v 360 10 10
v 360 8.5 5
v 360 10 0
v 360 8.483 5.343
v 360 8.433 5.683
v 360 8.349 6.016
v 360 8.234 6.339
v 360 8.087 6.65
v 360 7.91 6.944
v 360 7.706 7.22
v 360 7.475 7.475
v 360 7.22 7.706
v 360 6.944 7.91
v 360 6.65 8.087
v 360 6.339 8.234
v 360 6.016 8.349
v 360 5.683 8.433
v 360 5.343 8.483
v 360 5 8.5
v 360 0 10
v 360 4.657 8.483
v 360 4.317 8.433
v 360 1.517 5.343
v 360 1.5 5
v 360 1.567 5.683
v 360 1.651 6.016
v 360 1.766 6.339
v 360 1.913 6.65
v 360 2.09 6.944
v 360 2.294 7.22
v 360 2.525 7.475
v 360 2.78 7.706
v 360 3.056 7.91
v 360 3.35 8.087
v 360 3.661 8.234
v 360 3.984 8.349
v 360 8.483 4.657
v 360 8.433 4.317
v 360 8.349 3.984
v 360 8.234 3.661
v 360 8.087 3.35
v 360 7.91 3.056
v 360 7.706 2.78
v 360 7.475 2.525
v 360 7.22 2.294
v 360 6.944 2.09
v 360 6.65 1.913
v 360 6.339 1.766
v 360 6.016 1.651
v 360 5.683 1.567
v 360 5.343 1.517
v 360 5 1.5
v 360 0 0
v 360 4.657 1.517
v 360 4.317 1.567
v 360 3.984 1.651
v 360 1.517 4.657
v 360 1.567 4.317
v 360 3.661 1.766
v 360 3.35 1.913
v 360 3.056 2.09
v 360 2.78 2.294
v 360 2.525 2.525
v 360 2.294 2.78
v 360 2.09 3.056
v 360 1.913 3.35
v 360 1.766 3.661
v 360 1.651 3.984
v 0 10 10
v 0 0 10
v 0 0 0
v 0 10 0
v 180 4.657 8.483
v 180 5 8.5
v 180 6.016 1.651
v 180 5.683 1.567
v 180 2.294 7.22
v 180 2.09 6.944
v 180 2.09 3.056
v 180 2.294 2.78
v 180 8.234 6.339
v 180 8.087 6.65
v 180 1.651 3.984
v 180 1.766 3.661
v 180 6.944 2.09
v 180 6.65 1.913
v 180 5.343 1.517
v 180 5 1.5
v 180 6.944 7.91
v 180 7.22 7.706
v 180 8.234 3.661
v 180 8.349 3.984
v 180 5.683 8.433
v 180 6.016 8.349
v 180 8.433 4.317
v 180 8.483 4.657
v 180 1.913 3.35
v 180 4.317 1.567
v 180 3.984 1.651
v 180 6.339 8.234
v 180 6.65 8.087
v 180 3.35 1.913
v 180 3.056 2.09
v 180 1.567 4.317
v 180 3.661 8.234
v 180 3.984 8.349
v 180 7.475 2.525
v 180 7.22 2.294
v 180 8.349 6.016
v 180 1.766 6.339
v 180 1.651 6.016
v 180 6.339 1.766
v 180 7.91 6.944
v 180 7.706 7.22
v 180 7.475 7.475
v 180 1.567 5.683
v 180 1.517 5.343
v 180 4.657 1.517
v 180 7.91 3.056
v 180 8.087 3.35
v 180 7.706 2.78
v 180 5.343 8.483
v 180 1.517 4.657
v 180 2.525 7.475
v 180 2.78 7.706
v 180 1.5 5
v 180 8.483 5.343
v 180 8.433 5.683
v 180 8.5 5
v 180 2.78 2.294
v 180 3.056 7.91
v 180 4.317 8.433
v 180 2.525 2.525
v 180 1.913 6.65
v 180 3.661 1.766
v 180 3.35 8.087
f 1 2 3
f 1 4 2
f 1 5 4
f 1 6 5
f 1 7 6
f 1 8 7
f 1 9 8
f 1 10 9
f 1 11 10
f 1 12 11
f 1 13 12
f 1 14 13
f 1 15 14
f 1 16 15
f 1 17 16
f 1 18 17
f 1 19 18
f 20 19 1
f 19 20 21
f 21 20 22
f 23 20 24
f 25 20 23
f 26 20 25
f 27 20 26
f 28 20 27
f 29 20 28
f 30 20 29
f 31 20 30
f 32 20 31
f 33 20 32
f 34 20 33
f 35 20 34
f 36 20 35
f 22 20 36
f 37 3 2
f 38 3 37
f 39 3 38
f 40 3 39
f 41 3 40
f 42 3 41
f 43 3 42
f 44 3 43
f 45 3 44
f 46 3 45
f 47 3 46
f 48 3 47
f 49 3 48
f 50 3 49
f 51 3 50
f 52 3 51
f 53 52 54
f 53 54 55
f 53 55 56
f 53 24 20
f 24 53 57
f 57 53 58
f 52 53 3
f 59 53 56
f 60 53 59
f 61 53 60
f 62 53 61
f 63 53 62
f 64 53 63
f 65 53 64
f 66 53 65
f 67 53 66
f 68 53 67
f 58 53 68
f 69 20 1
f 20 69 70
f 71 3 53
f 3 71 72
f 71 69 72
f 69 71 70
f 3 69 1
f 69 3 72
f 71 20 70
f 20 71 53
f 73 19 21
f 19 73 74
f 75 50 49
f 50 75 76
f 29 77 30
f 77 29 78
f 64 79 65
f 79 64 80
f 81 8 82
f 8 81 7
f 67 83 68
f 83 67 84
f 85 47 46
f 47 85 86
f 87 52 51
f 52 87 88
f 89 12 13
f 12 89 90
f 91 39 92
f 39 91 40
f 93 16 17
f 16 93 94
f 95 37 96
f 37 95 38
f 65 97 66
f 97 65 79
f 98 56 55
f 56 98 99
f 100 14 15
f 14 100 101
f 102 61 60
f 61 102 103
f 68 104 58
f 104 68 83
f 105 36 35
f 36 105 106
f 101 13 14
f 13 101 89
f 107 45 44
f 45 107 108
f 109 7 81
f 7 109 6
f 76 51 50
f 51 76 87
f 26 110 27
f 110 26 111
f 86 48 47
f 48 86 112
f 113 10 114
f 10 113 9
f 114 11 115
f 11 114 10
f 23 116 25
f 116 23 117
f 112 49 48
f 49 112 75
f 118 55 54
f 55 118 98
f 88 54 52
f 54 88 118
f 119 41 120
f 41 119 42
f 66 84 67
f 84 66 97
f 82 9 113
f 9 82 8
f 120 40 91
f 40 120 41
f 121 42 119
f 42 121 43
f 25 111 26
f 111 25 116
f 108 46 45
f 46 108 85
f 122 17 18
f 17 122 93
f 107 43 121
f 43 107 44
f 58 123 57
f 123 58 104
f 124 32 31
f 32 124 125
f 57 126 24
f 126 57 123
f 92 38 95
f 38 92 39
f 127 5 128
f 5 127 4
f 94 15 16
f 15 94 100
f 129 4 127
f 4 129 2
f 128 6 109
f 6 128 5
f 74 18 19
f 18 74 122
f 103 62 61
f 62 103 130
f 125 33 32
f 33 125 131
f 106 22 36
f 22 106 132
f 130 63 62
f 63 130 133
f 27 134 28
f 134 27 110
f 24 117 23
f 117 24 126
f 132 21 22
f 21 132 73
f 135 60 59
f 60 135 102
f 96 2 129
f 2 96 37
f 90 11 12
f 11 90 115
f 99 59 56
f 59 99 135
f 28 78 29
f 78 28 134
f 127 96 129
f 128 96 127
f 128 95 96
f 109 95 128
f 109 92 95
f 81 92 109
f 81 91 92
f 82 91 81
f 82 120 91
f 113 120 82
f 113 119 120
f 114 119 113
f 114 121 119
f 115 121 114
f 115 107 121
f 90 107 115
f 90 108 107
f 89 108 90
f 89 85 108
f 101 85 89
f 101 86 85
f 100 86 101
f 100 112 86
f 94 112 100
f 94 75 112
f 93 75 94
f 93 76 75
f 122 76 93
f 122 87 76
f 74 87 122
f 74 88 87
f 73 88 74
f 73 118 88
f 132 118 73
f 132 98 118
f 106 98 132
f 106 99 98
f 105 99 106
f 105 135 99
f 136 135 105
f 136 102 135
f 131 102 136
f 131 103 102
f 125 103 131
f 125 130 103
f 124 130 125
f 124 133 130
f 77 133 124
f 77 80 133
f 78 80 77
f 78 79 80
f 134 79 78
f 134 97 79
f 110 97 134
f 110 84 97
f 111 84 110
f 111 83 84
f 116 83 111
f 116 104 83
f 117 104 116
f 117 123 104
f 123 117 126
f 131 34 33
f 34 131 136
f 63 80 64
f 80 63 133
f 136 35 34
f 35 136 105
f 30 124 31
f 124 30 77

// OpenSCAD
// column_half.scad (same as previous; reused for each column segment)

length = 360;
thk = 10;
hole_d = 7; // clearance for M6
$fn = 64;

module column_segment(len=length, t=thk, hd=hole_d) {
    difference() {
        translate([0,0,0]) cube([len, t, t]);
        translate([len/2, t/2, t/2]) rotate([0,90,0]) cylinder(r=hd/2, h=len + 20, $fn=$fn);
    }
}

column_segment();
